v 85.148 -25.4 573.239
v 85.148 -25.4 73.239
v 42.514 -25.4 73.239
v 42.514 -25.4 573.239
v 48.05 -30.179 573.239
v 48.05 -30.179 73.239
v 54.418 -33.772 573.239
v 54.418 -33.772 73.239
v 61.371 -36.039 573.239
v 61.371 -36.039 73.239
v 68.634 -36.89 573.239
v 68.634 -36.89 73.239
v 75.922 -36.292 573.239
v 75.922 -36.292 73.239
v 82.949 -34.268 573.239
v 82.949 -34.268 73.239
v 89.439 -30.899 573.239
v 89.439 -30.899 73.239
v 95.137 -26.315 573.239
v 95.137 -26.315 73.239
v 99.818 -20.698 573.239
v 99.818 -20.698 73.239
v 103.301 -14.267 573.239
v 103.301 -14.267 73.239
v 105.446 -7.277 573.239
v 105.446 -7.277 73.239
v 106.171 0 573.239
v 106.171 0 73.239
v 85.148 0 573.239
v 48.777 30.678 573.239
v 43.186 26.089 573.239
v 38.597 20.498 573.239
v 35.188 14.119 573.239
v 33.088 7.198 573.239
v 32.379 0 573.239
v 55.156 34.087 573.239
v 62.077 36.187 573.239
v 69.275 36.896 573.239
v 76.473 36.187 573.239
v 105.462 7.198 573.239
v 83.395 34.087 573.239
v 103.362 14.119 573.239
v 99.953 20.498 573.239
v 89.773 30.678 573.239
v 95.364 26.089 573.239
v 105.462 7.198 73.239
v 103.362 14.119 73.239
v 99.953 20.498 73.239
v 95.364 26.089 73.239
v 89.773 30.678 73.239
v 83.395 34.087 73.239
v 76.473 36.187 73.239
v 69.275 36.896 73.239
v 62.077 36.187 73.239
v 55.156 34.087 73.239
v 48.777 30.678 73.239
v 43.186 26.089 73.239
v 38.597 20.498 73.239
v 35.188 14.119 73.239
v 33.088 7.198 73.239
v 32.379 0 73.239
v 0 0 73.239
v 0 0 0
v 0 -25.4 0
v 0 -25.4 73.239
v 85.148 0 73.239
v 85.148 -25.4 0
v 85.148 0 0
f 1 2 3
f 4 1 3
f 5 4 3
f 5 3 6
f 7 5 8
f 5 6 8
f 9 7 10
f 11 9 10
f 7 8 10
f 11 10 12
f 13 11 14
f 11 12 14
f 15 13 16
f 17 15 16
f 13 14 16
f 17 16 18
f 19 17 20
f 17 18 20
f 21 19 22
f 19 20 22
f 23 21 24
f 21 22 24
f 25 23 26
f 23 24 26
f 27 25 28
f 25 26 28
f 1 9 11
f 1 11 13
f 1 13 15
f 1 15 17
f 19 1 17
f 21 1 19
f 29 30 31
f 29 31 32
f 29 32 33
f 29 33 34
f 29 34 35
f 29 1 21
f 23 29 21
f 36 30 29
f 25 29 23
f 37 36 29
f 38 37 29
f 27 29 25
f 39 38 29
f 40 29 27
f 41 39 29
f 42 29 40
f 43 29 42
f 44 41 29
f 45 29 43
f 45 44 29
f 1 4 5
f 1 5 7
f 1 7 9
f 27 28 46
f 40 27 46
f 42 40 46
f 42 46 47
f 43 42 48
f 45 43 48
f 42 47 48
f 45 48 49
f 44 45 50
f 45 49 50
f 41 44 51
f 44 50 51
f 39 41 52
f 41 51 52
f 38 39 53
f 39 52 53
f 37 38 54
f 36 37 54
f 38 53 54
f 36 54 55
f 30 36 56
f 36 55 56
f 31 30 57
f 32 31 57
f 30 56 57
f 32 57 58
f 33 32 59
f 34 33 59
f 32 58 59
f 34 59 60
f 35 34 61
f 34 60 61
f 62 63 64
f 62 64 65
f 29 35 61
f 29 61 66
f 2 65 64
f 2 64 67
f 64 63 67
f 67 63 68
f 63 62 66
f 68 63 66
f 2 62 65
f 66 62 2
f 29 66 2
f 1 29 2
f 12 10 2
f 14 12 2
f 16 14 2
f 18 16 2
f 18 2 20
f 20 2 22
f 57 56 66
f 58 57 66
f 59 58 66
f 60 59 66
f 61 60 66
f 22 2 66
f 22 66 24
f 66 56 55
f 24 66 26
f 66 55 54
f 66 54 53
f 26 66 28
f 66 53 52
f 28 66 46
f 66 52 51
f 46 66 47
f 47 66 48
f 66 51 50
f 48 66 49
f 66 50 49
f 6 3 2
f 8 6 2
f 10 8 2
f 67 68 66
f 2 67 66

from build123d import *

# Parameters (mm, degrees)
F0_W     = 85.148022
F0_H     = 73.238932
F1_DEPTH = 25.4
F3_DEPTH = 500


with BuildPart() as f1:
    # F0 (on Front) → F1 (new body)
    with BuildSketch(Plane.XZ):
        with Locations((42.574011, 36.619466)):
            Rectangle(F0_W, F0_H)
    extrude(amount=F1_DEPTH)


with BuildPart() as f3:
    # F2 (on face) → F3 (new body)
    with BuildSketch(Plane.XY.offset(73.238932)):
        with BuildLine():
            ThreePointArc((42.514496, -25.4), (82.948831, -34.268386), (106.170833, 0))
            ThreePointArc((106.170833, 0), (69.275141, 36.895692), (32.379449, 0))
            Line((32.379449, 0), (85.148022, 0))
            Line((85.148022, 0), (85.148022, -25.4))
            Line((85.148022, -25.4), (42.514496, -25.4))
        make_face()
    extrude(amount=F3_DEPTH)


solid = Compound([f1.part, f3.part])
